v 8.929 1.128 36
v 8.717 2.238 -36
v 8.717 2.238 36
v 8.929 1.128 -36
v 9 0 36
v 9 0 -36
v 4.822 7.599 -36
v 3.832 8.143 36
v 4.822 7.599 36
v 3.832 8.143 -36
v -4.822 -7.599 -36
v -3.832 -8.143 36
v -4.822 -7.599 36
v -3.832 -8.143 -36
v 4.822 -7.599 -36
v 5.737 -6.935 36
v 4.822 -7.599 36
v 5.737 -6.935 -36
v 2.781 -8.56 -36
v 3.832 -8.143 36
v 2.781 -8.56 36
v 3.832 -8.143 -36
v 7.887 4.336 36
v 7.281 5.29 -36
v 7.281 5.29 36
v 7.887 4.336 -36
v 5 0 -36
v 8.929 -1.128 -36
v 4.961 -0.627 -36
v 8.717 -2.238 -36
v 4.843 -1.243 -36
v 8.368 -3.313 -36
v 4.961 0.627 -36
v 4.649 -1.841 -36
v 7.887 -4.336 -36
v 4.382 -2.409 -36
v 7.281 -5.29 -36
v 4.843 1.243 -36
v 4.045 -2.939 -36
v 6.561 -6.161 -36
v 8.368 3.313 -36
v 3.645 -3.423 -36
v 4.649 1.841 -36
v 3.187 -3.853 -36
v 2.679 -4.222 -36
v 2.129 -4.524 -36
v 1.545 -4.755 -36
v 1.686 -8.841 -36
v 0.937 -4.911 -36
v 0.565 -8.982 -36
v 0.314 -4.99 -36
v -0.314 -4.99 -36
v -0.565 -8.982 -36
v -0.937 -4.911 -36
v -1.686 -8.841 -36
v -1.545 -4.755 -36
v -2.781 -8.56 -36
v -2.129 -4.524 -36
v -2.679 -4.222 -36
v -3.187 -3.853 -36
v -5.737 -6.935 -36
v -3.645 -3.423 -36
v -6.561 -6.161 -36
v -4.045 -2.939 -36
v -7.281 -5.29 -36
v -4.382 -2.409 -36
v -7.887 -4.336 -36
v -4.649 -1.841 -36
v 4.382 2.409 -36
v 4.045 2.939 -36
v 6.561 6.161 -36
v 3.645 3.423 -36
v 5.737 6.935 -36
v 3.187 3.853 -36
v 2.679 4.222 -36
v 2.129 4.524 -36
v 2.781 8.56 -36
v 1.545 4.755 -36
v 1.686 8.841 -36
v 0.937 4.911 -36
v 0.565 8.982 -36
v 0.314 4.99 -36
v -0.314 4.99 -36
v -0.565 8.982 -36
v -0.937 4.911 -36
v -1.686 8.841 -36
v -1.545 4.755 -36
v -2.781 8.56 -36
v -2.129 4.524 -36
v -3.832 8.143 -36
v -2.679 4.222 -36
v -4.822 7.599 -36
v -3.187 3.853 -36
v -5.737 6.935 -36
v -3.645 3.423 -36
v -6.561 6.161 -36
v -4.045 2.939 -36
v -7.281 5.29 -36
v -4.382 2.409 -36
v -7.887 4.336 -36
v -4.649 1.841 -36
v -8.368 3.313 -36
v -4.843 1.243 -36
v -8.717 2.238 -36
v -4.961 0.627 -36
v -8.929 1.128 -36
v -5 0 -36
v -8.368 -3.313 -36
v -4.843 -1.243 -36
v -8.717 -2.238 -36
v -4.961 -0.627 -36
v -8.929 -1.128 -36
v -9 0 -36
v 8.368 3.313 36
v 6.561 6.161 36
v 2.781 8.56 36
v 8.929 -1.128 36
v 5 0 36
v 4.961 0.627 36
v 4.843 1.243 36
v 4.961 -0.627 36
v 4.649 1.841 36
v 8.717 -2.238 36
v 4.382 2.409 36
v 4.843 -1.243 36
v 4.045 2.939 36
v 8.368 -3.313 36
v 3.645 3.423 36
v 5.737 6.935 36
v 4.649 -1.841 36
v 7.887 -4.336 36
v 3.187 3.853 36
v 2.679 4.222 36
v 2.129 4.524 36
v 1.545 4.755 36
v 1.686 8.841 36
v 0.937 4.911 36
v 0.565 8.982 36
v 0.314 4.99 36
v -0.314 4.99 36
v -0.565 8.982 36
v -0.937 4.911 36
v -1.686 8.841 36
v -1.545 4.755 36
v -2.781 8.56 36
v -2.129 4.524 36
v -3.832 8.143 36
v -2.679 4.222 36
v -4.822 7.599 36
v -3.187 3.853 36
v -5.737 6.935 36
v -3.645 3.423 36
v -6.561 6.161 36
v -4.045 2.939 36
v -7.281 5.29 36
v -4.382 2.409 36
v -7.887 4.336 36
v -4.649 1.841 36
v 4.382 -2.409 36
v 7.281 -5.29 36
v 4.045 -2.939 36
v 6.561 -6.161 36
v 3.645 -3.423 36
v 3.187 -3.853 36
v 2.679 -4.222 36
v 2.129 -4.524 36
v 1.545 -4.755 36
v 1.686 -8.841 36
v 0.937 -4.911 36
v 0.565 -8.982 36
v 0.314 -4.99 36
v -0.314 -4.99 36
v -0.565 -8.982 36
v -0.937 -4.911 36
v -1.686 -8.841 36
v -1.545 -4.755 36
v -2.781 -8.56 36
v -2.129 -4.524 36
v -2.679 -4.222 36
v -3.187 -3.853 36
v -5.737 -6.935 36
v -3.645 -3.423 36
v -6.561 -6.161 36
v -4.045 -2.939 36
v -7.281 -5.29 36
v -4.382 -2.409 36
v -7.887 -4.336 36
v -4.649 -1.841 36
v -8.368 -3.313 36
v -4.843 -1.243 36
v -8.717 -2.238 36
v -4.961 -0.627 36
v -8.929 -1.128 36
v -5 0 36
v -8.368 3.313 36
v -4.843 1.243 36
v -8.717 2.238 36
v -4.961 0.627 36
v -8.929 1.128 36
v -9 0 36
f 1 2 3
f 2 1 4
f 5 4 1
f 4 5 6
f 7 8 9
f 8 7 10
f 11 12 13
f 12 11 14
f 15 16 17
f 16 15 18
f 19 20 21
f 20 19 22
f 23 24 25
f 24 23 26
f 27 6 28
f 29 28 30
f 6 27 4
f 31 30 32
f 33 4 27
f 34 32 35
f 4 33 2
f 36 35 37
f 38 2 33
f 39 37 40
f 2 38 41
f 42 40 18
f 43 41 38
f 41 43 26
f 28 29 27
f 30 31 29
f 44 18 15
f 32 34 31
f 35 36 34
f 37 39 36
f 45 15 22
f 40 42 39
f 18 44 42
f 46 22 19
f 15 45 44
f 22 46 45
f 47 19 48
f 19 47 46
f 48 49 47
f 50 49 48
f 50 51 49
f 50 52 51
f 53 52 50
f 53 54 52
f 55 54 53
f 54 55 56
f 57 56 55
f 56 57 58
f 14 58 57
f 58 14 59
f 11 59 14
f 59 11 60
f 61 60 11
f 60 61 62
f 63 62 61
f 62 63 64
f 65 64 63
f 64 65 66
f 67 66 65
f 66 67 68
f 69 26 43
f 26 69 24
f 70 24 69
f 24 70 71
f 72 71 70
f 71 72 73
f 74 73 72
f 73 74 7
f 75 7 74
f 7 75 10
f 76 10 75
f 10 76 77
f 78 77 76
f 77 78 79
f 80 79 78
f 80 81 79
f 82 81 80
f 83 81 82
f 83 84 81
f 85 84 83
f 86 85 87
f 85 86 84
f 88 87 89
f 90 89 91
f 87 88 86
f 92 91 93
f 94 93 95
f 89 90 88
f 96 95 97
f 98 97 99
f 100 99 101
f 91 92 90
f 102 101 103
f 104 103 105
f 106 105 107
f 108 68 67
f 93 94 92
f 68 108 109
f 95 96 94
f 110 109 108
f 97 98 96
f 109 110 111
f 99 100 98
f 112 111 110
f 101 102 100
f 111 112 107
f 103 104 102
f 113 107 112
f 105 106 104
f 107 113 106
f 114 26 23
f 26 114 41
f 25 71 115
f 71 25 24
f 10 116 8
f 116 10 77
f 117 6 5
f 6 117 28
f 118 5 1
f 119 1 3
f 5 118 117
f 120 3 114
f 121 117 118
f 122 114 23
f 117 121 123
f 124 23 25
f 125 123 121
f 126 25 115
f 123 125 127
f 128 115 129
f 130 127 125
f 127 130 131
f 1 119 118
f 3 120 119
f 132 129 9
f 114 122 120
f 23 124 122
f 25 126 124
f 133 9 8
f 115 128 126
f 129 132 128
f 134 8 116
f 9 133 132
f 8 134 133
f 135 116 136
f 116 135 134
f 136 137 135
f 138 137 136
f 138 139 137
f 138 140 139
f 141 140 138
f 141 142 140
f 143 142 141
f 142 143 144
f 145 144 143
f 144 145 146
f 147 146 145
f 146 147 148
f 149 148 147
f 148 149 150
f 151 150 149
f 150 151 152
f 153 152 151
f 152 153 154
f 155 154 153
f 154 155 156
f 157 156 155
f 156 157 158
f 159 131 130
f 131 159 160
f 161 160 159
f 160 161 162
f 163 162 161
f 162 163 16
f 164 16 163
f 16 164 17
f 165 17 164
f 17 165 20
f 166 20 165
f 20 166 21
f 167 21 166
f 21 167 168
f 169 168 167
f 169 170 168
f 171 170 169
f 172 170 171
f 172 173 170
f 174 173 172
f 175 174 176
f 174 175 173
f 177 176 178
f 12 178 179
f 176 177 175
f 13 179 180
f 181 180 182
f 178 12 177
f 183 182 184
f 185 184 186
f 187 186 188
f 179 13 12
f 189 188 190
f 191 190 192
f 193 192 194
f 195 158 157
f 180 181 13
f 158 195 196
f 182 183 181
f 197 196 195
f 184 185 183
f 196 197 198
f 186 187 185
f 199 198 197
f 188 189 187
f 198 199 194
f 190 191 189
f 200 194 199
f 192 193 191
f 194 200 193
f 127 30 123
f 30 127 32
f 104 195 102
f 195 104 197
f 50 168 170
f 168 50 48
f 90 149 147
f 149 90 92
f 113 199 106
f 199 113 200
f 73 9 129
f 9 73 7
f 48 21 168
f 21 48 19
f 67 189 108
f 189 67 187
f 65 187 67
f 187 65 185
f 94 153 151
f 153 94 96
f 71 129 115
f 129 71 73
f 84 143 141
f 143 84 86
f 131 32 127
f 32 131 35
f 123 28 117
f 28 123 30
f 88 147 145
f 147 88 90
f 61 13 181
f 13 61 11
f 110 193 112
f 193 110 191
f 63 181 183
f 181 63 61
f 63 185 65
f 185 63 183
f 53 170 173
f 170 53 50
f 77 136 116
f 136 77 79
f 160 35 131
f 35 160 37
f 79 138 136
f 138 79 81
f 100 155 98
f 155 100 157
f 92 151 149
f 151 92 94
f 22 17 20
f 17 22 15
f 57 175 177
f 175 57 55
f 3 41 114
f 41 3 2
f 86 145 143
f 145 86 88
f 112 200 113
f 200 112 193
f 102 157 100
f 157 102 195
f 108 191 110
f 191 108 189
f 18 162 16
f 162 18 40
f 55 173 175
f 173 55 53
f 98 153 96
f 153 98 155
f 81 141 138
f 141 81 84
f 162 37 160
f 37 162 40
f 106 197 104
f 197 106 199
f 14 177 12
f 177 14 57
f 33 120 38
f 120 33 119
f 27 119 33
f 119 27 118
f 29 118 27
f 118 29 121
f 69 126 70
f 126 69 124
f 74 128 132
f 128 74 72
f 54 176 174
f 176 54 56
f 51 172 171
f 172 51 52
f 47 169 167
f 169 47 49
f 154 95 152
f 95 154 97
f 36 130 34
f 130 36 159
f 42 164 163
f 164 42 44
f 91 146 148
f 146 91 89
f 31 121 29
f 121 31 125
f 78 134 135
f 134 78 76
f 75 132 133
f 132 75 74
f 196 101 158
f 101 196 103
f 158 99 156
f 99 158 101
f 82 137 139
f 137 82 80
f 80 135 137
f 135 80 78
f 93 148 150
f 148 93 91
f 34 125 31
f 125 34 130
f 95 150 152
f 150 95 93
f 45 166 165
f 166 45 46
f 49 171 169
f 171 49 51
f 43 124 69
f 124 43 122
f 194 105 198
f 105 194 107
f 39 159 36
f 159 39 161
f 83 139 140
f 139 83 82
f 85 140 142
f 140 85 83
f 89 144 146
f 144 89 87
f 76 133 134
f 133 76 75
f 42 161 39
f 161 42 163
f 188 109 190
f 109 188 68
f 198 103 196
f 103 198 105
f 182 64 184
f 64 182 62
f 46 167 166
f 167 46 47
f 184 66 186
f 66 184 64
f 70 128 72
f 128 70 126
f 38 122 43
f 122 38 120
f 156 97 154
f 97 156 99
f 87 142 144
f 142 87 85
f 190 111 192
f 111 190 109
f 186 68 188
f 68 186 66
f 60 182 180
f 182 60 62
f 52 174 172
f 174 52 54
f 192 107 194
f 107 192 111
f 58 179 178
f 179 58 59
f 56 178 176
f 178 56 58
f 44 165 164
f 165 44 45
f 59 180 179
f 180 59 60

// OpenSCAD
$fn = 50;


difference() {
	union() {
		translate(v = [0, 0, -36.0000000000]) {
			cylinder(h = 72, r = 9.0000000000);
		}
	}
	union() {
		translate(v = [0, 0, -100.0000000000]) {
			cylinder(h = 200, r = 5.0000000000);
		}
	}
}
